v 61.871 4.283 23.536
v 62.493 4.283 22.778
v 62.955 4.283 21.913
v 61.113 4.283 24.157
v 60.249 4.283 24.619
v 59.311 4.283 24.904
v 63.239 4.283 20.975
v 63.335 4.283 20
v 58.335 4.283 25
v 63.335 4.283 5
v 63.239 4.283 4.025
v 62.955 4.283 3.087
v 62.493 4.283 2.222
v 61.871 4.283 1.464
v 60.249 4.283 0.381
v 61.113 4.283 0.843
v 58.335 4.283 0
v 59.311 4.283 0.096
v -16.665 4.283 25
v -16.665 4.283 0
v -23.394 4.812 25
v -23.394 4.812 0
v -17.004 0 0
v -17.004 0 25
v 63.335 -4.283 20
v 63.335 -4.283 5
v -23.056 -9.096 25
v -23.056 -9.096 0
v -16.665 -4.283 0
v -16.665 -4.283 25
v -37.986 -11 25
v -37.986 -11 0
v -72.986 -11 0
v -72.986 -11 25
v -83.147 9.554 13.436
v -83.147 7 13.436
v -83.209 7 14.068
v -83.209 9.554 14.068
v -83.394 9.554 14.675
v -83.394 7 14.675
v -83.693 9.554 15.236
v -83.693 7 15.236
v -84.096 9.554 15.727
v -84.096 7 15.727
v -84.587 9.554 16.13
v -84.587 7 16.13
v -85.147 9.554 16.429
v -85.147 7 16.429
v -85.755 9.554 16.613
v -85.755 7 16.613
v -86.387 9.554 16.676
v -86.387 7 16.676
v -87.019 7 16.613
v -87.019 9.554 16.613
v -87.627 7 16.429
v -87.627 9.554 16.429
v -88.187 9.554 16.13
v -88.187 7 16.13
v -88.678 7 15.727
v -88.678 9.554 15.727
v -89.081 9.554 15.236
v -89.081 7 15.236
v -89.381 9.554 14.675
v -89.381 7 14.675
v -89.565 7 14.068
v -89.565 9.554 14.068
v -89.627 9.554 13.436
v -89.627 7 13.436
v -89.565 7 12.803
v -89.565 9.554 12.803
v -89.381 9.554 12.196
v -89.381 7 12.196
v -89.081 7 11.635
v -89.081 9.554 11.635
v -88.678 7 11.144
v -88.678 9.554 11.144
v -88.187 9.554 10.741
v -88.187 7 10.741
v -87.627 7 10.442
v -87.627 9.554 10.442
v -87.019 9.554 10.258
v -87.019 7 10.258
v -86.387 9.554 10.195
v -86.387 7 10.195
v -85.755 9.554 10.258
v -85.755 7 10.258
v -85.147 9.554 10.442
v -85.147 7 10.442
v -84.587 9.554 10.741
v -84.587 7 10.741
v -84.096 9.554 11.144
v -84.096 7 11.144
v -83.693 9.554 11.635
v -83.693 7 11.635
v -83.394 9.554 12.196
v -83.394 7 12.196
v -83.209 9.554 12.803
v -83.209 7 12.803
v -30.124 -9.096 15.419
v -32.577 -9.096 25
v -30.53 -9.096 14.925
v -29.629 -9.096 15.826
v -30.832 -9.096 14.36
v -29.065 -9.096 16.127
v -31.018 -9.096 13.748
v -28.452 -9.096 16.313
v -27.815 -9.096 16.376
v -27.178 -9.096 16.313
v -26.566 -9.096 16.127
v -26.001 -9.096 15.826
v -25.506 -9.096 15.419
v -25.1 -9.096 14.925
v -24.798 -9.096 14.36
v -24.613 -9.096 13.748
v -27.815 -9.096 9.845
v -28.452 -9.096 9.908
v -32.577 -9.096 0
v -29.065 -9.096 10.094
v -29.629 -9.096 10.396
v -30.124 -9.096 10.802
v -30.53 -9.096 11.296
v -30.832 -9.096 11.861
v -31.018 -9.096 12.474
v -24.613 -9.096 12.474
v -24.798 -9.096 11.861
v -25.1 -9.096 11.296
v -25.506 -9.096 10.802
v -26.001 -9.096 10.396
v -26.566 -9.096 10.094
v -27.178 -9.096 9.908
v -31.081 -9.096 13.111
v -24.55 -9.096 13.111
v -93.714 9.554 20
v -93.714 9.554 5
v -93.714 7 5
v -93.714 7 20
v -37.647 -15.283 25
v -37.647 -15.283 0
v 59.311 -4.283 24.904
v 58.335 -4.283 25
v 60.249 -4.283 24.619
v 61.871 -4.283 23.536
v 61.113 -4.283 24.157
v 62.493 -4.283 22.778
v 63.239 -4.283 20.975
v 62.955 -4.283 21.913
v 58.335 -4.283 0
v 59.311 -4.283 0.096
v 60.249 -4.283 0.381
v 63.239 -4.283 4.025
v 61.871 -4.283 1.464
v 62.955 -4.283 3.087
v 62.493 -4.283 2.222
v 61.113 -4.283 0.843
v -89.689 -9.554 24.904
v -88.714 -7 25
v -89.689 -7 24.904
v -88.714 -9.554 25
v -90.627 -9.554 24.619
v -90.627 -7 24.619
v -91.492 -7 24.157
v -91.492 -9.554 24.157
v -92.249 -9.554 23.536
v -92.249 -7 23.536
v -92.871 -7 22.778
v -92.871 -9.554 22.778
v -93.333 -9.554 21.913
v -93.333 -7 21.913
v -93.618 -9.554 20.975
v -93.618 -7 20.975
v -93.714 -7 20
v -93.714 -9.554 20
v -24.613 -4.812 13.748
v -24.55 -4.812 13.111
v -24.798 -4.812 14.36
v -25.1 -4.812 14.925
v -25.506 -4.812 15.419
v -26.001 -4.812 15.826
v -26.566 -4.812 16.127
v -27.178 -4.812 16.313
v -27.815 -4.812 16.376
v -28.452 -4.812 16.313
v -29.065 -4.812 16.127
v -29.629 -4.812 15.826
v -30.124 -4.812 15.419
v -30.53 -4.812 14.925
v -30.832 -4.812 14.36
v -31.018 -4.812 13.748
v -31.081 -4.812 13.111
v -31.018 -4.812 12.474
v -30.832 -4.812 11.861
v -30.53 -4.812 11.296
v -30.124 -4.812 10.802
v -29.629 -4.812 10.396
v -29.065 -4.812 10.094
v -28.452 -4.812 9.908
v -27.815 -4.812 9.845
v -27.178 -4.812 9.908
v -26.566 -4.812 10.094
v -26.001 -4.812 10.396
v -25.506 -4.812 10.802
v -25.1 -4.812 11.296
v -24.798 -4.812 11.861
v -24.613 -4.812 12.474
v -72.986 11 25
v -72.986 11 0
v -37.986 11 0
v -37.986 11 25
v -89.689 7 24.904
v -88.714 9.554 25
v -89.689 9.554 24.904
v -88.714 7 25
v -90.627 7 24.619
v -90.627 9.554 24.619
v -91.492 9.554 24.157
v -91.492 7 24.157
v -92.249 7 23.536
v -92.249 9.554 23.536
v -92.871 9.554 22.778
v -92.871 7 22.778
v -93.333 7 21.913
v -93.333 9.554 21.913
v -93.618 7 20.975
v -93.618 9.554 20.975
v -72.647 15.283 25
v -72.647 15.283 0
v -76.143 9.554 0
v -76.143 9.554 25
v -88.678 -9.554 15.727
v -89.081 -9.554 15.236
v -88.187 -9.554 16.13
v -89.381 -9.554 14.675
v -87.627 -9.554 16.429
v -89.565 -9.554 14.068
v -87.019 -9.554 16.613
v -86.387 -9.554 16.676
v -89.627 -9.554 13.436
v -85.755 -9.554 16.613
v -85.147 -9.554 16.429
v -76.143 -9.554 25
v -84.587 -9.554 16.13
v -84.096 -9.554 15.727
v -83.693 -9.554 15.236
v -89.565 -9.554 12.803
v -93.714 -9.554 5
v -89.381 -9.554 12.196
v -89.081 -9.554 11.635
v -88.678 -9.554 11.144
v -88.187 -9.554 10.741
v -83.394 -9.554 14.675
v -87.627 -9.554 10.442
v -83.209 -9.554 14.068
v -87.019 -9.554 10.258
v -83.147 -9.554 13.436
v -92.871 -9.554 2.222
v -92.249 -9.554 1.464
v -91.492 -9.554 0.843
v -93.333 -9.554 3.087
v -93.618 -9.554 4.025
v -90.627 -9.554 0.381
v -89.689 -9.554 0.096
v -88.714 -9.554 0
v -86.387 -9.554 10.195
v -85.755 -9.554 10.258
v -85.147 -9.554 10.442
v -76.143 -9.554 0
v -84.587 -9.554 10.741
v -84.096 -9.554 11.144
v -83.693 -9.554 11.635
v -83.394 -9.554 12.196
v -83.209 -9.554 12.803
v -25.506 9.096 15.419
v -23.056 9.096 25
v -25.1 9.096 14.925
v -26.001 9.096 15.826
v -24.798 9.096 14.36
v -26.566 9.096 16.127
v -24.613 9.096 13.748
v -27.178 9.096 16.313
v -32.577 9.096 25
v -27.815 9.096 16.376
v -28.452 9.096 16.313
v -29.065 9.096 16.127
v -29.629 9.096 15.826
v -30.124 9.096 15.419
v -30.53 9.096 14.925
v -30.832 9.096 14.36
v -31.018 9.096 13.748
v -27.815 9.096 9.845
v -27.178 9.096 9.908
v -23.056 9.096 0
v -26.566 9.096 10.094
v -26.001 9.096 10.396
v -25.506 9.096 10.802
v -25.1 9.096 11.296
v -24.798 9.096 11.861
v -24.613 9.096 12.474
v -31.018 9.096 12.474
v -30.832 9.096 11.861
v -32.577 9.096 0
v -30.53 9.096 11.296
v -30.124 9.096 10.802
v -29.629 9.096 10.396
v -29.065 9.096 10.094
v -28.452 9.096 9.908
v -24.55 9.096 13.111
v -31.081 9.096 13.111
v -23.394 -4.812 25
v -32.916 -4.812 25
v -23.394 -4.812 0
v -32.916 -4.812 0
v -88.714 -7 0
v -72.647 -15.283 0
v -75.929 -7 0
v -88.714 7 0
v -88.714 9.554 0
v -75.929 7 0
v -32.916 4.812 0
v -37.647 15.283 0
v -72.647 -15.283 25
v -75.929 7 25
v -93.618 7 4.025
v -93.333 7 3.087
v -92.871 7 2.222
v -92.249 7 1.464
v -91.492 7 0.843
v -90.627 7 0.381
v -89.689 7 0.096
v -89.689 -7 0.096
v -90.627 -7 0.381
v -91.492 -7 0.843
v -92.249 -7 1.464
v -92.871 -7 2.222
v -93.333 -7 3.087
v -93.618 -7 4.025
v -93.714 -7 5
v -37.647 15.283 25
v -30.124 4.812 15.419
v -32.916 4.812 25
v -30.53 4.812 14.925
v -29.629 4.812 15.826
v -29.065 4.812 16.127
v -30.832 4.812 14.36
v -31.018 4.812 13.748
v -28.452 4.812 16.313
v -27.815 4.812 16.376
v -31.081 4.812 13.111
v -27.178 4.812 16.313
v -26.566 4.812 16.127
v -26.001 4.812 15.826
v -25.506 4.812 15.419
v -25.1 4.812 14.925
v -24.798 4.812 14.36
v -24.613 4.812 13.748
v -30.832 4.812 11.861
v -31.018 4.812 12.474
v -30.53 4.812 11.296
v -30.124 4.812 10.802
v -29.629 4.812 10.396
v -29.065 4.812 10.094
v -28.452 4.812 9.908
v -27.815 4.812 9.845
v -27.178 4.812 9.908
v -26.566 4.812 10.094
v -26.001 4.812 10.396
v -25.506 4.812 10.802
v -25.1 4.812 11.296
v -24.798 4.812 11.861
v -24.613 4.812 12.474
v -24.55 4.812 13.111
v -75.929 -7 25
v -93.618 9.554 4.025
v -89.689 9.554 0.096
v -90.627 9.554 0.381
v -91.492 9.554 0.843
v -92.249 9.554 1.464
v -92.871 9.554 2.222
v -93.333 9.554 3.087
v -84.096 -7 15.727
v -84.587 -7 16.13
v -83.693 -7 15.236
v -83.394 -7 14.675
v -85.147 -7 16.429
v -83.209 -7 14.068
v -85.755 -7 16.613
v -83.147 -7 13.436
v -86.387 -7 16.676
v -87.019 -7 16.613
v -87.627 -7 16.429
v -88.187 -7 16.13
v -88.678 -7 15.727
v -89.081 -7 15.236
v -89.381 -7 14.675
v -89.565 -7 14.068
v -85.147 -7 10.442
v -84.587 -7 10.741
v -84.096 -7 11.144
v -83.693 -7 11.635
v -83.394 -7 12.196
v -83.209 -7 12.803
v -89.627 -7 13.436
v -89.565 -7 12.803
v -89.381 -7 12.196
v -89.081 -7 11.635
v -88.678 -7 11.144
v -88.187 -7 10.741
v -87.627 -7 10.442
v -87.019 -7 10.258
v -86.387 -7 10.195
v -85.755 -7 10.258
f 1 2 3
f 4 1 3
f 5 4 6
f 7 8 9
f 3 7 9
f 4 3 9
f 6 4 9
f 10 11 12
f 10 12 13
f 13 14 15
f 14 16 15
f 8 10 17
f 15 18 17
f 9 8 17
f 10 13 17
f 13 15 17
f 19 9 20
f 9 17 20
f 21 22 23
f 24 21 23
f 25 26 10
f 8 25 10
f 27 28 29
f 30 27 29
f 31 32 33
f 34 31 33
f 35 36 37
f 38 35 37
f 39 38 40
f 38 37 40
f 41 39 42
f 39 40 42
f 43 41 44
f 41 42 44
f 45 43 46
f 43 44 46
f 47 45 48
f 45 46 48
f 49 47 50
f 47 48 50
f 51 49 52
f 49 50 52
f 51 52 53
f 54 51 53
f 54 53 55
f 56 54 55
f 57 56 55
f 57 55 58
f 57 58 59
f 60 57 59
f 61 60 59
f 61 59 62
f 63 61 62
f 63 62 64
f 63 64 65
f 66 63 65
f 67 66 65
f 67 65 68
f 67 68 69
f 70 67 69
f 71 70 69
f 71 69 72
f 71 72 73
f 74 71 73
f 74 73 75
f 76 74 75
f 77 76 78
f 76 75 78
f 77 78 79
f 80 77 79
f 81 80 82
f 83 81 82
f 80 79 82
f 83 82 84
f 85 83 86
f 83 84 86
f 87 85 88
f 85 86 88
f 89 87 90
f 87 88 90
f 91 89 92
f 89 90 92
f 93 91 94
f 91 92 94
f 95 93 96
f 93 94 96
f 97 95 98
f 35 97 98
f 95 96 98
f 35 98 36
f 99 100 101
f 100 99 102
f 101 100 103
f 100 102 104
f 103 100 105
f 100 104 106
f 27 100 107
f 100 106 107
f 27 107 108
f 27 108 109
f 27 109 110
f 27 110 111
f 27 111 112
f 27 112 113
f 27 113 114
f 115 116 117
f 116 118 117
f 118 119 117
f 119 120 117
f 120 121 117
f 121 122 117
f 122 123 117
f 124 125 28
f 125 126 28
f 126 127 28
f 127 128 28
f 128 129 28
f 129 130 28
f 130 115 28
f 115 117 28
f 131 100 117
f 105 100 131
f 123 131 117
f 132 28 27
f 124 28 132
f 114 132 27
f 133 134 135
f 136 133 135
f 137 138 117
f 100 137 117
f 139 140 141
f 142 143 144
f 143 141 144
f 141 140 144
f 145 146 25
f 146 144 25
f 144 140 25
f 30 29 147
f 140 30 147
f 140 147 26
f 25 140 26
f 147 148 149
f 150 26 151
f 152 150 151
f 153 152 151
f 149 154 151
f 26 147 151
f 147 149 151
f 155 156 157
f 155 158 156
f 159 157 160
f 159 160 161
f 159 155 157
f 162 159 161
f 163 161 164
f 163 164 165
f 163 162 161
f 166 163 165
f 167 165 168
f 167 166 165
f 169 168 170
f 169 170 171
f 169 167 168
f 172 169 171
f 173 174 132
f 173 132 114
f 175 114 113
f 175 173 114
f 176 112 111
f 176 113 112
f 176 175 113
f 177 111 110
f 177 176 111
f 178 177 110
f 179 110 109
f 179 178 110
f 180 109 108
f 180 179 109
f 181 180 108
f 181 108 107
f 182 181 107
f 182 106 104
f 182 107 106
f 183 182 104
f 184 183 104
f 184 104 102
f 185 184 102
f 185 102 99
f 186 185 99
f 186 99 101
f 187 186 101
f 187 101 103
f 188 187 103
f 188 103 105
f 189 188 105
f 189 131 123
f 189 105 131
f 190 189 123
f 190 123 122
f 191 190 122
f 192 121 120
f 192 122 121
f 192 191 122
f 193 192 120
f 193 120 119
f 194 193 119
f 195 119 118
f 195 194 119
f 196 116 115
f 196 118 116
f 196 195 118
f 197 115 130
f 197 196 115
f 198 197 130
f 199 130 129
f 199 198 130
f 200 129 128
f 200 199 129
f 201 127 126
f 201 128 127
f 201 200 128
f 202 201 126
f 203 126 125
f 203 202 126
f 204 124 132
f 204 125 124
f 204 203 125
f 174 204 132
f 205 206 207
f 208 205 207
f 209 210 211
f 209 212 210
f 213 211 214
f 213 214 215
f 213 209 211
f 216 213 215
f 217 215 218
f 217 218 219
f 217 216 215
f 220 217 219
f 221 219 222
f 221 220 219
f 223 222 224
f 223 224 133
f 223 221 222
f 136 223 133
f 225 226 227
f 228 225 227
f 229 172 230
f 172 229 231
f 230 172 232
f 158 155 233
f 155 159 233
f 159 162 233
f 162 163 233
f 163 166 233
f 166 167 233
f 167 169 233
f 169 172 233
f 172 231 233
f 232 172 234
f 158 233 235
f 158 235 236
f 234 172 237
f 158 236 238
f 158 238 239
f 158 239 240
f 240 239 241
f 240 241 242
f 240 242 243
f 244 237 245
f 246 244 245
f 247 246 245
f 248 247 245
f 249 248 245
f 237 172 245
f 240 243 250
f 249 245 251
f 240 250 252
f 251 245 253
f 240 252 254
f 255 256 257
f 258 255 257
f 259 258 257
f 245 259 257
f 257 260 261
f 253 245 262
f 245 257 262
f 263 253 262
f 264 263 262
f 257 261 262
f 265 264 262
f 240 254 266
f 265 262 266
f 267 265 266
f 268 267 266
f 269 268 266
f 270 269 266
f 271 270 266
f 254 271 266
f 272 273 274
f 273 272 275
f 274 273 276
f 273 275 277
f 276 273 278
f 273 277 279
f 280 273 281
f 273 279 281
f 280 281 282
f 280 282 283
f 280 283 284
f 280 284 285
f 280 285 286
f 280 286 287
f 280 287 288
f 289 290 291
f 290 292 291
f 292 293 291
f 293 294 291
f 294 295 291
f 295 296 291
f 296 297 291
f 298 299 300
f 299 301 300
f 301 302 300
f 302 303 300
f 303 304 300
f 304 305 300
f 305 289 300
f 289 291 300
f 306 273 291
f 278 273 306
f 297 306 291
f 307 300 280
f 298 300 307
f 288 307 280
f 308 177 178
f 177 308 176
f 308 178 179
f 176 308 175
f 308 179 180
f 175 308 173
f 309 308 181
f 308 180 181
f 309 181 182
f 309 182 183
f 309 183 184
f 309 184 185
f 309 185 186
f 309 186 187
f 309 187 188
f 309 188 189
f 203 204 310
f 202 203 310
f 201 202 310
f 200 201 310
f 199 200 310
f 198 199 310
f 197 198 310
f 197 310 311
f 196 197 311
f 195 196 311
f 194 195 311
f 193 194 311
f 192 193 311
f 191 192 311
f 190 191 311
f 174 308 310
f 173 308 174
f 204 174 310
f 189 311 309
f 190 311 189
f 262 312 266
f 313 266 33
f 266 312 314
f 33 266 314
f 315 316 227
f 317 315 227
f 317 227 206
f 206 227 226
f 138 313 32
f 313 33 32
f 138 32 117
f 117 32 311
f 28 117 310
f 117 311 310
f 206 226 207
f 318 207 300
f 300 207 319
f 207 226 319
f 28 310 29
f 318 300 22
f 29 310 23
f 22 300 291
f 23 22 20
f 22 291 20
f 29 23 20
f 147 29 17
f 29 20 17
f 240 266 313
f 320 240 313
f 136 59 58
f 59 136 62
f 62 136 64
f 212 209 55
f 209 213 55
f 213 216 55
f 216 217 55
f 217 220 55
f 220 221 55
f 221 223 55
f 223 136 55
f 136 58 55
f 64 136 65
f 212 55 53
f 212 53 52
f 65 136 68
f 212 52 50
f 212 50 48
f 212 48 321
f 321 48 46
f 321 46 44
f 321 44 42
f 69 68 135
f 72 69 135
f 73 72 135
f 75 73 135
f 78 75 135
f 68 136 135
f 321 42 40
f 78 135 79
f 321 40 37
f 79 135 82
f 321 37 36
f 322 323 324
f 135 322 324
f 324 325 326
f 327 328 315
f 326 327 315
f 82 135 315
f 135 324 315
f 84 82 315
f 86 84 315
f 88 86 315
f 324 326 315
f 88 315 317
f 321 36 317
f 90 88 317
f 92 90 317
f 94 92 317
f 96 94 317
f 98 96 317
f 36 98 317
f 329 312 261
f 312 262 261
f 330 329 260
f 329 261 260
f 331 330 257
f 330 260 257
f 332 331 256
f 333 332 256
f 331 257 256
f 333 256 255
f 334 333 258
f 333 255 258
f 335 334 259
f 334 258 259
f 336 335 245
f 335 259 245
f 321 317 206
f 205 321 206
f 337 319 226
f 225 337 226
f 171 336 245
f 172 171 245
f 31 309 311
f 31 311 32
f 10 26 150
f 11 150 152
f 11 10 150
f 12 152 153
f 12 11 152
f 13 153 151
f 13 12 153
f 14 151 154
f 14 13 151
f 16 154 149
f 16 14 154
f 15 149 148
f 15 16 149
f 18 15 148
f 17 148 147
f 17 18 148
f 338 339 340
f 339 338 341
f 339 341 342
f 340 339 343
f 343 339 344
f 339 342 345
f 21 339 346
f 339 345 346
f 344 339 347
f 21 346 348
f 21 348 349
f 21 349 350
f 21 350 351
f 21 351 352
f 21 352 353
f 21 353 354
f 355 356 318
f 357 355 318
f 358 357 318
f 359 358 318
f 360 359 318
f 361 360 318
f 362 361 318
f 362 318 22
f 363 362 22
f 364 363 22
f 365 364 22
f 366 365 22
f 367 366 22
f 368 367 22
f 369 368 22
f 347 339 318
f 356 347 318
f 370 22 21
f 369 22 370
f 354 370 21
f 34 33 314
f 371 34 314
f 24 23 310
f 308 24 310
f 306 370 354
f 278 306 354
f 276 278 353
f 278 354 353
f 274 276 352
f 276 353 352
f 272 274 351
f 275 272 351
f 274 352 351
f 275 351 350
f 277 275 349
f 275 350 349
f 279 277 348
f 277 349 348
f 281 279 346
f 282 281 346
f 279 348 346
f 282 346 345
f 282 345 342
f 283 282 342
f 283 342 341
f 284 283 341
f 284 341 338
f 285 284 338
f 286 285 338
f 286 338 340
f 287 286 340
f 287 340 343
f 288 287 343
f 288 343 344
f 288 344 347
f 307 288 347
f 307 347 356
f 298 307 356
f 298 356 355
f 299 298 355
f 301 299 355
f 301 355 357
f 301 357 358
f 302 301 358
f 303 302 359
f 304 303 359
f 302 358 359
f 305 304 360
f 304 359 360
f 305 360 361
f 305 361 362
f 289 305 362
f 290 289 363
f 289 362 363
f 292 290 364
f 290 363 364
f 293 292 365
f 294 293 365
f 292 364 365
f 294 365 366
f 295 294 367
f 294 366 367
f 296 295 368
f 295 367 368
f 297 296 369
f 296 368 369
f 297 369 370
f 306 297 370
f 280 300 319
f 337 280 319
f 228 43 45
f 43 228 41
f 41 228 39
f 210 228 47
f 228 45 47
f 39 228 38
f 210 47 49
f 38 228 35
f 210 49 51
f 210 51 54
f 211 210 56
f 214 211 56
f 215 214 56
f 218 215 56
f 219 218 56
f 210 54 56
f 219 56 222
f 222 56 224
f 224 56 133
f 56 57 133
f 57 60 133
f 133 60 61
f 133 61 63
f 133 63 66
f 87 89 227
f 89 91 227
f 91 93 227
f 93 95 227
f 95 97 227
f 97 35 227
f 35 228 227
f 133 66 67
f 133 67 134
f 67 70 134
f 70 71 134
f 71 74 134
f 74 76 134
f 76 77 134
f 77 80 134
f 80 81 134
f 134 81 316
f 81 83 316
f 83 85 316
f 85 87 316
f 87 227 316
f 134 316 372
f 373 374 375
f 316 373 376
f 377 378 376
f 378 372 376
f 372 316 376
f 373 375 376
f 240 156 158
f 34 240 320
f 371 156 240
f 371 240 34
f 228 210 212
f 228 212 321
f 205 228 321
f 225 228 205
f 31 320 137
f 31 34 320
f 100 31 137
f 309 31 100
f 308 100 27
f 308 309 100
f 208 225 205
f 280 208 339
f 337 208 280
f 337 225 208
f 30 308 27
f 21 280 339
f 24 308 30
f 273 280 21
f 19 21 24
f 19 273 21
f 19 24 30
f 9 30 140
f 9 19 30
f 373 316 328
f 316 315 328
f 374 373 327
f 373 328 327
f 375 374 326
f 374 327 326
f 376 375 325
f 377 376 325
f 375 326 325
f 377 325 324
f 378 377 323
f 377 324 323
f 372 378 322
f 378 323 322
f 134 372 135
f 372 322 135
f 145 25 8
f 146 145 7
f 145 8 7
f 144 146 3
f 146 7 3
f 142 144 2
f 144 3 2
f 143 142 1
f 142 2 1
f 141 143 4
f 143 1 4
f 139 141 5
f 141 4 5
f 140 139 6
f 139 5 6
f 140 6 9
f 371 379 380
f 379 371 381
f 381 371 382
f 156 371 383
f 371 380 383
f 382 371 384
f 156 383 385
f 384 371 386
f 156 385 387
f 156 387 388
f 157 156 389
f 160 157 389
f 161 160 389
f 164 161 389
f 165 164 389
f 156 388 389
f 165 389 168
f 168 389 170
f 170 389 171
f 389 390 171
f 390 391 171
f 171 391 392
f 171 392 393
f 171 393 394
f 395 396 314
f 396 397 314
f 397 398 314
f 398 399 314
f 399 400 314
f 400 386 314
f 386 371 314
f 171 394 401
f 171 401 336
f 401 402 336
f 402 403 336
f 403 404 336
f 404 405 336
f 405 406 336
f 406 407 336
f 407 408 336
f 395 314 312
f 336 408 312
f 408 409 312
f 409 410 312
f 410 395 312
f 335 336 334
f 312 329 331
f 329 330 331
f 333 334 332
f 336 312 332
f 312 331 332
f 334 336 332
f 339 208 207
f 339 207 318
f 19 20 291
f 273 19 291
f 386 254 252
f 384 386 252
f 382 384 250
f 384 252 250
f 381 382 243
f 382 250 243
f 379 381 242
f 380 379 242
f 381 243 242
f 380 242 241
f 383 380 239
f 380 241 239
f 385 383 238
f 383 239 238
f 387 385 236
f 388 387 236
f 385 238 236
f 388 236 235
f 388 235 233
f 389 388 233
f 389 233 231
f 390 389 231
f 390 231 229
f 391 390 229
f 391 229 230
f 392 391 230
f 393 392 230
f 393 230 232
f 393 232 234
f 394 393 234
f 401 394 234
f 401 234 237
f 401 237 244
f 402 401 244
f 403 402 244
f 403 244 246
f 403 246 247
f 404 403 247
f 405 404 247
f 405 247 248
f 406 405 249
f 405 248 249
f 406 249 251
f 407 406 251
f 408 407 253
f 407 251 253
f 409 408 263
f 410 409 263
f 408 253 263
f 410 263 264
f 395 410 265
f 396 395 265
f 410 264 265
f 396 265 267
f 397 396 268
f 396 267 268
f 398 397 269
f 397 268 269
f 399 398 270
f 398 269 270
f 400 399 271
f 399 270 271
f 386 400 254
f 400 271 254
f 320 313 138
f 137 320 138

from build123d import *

# Parameters (mm, degrees)
F1_DEPTH      = 25
F2_R          = 5
F3_R          = 5
F4_R          = 3.2402082651
F5_DEPTH      = 25
F5_DEPTH_BACK = 25
F6_R          = 3.2653549995
F7_DEPTH      = 25
F7_DEPTH_BACK = 25


with BuildPart() as f1:
    # F0 (on Top) → F1 (new body)
    with BuildSketch(Plane.XY):
        Polygon((-23.0555834253, -9.0956758987), (-16.664795906, -4.2834170857), (55.335204094, -4.2834170857), (63.335204094, -4.2834170857), (63.335204094, 4.2834170857), (55.335204094, 4.2834170857), (-16.664795906, 4.2834170857), (-23.0555834253, 9.0956758987), (-32.5767005301, 9.0956758987), (-37.6473867758, 15.2834170857), (-72.6473867758, 15.2834170857), (-76.1434496577, 9.5535986996), (-93.7138741884, 9.5535986996), (-93.7138741884, 7), (-75.9291218825, 7), (-72.9862269919, 11), (-37.9862269919, 11), (-32.9155407462, 4.812258813), (-23.3944236414, 4.812258813), (-17.0036361221, 0), (-23.3944236414, -4.812258813), (-32.9155407462, -4.812258813), (-37.9862269919, -11), (-72.9862269919, -11), (-75.9291218825, -7), (-93.7138741884, -7), (-93.7138741884, -9.5535986996), (-76.1434496577, -9.5535986996), (-72.6473867758, -15.2834170857), (-37.6473867758, -15.2834170857), (-32.5767005301, -9.0956758987), align=None)
    extrude(amount=F1_DEPTH)

    # F2
    f2_edges = [f1.edges().sort_by_distance(p)[0] for p in [
        (63.335204, 0, 25),
        (63.335204, 0, 0),
    ]]
    fillet(f2_edges, radius=F2_R)

    # F3
    f3_edges = [f1.edges().sort_by_distance(p)[0] for p in [
        (-93.713874, 8.276799, 25),
        (-93.713874, 8.276799, 0),
        (-93.713874, -8.276799, 25),
        (-93.713874, -8.276799, 0),
    ]]
    fillet(f3_edges, radius=F3_R)

    # F4 (on face) → F5 (cut, two sides)
    with BuildSketch(Plane.XZ.offset(9.5535986996)) as f5_sk:
        with Locations((-86.387142539, 13.4355006739)):
            Circle(F4_R)
    extrude(amount=F5_DEPTH, mode=Mode.SUBTRACT)
    extrude(f5_sk.sketch, amount=-F5_DEPTH_BACK, mode=Mode.SUBTRACT)

    # F6 (on Front) → F7 (cut, two sides)
    with BuildSketch(Plane.XZ) as f7_sk:
        with Locations((-27.815233916, 13.1105445325)):
            Circle(F6_R)
    extrude(amount=-F7_DEPTH, mode=Mode.SUBTRACT)
    extrude(f7_sk.sketch, amount=F7_DEPTH_BACK, mode=Mode.SUBTRACT)


solid = f1.part
